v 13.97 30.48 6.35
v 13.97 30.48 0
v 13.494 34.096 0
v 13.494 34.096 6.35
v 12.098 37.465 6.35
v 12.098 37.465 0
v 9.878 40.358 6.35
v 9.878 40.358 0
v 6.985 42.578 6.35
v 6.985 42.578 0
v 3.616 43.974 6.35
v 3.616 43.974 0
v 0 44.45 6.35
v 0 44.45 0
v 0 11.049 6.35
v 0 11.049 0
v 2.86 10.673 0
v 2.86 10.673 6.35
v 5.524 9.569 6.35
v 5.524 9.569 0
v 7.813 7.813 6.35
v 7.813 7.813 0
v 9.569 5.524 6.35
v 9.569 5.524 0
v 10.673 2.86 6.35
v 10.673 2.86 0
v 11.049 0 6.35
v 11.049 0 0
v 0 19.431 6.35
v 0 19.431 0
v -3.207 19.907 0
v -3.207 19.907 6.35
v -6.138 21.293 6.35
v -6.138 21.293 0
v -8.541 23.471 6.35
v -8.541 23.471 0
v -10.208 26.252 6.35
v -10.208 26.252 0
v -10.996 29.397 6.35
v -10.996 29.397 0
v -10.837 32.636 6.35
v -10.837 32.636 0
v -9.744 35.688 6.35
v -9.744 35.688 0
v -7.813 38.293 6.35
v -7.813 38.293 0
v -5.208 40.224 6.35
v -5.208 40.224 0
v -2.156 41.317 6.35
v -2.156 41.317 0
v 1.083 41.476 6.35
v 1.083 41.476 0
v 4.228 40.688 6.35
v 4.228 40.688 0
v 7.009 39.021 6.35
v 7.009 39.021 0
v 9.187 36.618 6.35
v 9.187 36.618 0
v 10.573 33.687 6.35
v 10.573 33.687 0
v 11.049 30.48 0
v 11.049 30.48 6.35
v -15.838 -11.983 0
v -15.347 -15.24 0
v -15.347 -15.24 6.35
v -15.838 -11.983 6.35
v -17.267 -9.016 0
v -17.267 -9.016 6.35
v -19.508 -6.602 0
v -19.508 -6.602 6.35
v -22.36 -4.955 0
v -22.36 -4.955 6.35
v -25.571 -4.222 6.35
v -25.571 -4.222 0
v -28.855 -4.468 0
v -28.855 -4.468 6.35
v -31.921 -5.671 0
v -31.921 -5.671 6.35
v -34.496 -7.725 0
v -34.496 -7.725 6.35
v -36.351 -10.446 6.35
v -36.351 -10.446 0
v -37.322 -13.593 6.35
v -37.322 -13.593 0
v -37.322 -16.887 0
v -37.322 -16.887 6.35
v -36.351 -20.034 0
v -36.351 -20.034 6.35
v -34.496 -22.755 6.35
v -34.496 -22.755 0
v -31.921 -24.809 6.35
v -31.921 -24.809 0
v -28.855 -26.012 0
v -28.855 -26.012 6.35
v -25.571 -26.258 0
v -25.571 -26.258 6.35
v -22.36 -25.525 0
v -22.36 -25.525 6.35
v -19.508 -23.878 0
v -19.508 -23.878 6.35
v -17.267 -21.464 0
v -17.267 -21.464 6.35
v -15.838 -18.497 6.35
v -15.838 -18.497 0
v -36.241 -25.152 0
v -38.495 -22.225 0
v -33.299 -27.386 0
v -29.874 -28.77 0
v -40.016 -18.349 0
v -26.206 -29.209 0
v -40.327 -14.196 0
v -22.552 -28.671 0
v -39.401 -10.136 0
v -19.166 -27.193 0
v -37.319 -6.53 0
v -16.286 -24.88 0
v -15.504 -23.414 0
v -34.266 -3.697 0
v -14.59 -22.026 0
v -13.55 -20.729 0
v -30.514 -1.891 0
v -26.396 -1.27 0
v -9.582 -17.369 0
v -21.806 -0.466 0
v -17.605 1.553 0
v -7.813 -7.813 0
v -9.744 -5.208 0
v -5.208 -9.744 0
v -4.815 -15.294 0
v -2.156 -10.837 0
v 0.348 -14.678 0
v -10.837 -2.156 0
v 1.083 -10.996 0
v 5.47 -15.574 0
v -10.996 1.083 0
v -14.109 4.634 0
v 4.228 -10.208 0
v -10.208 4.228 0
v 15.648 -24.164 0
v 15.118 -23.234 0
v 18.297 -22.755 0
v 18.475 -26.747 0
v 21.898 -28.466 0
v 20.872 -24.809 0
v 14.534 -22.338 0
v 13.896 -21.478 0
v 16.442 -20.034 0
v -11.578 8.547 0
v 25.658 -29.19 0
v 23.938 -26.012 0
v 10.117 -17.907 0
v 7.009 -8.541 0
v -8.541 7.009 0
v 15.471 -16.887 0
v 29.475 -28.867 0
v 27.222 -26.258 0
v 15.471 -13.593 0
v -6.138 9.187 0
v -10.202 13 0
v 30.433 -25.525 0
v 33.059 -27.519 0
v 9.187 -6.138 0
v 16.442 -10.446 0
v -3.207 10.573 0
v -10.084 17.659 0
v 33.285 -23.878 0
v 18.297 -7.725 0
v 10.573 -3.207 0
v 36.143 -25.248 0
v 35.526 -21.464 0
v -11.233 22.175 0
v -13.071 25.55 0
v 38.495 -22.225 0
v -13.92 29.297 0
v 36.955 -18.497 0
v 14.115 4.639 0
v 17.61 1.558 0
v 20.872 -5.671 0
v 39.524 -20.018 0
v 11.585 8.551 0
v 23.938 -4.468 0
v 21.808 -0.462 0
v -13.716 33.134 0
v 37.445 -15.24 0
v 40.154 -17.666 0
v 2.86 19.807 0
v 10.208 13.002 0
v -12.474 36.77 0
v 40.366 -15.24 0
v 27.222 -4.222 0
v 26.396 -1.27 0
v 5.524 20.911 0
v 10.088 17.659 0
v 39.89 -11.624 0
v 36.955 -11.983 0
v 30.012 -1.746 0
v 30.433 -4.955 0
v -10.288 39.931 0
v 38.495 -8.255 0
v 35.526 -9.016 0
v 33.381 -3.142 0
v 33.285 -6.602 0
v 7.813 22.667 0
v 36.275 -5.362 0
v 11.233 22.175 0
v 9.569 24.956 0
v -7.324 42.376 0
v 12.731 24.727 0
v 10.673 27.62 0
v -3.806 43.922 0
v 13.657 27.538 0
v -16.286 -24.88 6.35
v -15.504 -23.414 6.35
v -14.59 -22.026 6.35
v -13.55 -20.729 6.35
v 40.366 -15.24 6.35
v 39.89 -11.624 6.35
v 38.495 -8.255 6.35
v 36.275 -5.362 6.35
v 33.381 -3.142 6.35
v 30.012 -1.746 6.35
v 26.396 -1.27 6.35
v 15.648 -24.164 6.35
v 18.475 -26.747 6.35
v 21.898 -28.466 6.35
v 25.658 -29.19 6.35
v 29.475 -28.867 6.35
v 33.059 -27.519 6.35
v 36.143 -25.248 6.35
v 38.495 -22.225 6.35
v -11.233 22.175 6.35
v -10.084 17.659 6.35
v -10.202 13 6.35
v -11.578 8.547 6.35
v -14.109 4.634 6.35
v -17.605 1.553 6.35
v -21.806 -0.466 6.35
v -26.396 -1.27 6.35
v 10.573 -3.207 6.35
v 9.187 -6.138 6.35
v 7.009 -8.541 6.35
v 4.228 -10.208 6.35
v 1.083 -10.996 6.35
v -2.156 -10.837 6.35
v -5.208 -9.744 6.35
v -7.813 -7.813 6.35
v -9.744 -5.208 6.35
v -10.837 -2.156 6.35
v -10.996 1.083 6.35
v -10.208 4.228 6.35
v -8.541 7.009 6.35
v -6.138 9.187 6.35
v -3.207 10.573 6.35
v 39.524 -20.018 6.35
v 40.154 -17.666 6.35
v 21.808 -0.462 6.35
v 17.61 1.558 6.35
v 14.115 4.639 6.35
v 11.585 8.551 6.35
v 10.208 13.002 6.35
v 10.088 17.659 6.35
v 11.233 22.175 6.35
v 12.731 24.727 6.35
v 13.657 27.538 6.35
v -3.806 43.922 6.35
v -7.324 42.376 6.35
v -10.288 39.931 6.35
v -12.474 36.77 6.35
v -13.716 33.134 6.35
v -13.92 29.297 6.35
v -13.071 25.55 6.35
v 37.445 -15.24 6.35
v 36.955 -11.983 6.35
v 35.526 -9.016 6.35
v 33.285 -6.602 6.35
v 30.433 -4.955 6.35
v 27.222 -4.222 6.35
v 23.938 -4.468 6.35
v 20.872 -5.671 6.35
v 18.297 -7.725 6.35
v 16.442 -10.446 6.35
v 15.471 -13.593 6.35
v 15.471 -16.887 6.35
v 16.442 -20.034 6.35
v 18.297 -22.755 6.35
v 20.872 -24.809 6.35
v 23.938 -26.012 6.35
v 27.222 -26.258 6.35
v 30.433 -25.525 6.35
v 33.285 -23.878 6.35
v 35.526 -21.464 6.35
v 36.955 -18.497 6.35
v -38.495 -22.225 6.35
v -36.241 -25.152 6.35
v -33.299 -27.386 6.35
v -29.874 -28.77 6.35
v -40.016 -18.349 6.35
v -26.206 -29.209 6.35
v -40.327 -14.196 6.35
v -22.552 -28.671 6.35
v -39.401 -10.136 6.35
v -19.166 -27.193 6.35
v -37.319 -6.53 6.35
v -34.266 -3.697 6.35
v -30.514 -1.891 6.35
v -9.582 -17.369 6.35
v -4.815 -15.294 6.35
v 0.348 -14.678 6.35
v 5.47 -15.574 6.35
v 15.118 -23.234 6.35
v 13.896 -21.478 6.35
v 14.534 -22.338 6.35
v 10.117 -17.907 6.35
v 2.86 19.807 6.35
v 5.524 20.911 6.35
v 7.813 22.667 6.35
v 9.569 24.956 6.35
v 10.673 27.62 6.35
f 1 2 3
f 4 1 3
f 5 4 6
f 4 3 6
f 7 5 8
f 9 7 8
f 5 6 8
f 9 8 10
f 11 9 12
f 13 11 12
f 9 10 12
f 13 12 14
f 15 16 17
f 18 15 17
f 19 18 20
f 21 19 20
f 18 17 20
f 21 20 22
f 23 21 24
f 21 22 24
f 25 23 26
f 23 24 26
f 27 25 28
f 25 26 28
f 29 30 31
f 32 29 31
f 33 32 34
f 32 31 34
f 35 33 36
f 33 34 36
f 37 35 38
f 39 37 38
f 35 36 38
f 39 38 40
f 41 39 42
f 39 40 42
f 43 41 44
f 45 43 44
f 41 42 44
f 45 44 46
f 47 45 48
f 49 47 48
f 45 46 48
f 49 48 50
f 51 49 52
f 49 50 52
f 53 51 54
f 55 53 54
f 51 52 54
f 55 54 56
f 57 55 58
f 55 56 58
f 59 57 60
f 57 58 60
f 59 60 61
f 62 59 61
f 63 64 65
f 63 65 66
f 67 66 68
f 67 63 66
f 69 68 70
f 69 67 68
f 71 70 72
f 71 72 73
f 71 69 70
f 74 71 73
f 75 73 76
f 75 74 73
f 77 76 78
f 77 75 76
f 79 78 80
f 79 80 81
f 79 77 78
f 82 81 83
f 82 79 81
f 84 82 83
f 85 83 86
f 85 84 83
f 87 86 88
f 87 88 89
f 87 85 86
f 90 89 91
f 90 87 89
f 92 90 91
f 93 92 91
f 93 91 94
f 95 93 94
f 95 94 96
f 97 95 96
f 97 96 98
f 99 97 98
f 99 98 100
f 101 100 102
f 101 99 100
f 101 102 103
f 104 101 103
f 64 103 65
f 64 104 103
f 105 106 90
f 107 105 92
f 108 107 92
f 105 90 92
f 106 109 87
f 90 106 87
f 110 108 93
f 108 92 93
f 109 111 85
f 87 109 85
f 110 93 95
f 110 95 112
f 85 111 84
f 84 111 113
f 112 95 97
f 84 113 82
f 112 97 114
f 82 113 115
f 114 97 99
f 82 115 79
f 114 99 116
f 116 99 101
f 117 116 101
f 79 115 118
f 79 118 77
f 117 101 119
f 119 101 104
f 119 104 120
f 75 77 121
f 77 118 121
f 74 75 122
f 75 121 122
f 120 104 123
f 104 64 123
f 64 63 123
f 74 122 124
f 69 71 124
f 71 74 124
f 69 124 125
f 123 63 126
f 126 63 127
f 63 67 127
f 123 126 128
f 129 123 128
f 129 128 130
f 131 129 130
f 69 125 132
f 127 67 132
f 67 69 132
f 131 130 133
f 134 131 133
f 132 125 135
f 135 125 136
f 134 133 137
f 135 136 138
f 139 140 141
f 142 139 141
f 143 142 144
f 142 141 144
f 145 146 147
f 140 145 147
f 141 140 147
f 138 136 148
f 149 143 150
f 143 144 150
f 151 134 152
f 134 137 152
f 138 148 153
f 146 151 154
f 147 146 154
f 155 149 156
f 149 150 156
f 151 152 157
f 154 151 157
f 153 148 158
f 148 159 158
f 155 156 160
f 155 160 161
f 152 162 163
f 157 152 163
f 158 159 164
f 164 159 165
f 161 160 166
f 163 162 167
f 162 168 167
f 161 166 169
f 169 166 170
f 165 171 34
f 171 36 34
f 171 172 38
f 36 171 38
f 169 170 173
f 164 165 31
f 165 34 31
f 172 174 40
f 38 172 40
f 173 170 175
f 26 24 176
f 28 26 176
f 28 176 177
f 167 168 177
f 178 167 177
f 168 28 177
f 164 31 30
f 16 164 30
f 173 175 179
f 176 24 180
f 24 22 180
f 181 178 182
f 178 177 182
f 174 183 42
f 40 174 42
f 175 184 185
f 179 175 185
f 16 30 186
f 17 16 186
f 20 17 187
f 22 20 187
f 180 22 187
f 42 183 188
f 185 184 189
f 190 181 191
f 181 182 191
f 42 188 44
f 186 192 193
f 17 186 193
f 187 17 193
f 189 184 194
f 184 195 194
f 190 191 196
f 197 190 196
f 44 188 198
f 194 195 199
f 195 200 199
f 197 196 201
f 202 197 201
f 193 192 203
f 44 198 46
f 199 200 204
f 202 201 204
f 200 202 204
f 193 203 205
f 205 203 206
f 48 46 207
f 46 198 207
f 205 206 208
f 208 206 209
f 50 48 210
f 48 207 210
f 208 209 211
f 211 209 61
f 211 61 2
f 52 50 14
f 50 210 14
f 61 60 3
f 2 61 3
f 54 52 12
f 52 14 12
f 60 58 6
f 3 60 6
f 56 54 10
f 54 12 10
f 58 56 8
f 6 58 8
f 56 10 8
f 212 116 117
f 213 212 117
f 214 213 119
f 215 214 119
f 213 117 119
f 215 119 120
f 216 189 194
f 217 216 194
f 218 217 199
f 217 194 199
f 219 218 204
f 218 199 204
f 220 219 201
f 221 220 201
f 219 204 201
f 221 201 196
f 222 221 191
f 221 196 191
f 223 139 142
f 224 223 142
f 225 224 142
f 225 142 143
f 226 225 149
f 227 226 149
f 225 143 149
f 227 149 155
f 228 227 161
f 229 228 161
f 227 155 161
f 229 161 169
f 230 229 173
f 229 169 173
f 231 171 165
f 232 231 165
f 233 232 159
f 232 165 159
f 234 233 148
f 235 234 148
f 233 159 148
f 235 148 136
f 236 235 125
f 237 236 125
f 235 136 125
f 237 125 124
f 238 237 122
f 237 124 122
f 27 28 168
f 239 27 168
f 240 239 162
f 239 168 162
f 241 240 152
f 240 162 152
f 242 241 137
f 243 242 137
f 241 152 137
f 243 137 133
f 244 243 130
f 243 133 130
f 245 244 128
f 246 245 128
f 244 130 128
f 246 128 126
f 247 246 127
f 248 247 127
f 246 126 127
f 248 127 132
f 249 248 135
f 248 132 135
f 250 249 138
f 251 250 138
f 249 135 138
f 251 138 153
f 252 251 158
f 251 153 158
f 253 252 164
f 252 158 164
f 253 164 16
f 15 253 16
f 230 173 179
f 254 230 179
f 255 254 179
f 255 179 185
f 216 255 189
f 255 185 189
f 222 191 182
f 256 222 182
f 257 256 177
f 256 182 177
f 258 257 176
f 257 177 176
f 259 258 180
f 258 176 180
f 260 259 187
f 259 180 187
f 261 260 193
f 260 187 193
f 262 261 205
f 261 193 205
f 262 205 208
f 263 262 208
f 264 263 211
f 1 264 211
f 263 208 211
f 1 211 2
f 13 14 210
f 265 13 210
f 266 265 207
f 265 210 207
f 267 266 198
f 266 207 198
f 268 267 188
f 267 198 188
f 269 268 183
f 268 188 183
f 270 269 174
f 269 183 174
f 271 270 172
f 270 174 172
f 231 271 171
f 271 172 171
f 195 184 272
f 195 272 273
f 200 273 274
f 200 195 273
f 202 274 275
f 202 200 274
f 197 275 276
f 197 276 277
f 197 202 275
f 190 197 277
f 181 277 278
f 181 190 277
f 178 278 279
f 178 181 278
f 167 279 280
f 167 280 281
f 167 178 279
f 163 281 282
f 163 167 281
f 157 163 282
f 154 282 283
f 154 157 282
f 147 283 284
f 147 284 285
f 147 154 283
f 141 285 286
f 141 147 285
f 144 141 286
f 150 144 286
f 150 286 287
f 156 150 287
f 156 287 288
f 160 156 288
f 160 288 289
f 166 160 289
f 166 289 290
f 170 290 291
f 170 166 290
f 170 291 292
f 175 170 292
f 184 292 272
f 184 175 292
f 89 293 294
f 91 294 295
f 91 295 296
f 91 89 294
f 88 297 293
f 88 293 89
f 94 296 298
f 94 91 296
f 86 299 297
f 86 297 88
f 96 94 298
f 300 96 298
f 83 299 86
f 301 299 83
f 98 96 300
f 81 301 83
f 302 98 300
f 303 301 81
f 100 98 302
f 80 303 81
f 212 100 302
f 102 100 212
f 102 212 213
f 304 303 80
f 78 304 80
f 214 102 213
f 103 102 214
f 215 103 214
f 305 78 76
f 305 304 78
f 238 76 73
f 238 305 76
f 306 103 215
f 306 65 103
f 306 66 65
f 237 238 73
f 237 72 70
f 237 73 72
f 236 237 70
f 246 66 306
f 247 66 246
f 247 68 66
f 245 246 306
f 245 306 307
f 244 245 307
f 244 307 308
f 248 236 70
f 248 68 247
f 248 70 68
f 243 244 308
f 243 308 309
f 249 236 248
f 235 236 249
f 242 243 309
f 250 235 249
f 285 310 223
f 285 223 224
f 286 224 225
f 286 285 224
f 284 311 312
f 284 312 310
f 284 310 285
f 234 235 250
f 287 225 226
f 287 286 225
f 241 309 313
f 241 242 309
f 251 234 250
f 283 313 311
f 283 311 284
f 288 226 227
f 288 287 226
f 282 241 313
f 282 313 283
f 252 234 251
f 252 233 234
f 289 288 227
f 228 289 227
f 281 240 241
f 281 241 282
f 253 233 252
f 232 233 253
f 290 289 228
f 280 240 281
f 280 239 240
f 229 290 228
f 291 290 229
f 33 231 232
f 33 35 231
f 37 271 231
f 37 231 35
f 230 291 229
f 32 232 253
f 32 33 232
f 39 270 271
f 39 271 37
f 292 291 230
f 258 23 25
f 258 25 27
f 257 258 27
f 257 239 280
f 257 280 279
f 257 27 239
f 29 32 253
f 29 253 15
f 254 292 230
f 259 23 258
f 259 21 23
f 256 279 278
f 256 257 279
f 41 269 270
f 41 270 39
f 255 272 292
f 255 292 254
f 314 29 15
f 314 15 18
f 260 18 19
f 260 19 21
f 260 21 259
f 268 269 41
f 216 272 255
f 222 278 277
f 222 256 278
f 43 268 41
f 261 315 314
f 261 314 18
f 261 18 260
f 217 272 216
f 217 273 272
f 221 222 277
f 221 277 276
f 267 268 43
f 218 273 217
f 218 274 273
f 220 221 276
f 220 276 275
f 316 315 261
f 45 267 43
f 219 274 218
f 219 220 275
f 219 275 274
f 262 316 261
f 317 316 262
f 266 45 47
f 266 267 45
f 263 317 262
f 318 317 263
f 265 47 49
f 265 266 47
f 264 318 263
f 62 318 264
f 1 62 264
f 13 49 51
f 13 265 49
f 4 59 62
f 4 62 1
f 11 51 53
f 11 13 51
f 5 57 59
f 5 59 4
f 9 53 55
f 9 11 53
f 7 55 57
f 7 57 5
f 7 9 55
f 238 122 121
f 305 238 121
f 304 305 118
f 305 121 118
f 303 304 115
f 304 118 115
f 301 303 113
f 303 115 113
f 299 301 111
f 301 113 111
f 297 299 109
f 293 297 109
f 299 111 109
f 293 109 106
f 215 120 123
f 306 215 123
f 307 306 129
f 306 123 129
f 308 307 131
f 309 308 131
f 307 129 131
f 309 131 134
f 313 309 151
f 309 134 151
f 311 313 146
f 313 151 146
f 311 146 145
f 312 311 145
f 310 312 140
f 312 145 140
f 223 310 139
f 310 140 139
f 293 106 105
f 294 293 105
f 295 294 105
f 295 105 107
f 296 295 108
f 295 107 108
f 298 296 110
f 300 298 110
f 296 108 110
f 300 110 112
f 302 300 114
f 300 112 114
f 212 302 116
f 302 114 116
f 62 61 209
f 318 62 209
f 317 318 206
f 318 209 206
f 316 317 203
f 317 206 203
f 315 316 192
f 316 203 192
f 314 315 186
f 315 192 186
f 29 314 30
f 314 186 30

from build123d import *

# Parameters (mm, degrees)
F1_R     = 11.049
F2_DEPTH = 6.35
F4_DEPTH = 6.35
F0_R     = 44.45
F0_R_2   = 11.049
F5_DEPTH = 113
F7_DEPTH = 6.351


# Not quite as in the source:
# - an extrude ends at something that could not be found from the text; its depth is read off the source's solid


with BuildPart() as f2:
    # F1 (on face) → F2 (new body)
    with BuildSketch(Plane.XY):
        with BuildLine():
            ThreePointArc((11.2333605356, 22.1750309406), (6.2904881464, 18.0064015264), (0, 16.51))
            ThreePointArc((0, 16.51), (-6.2904881464, 18.0064015264), (-11.2333605356, 22.1750309406))
            ThreePointArc((-11.2333605356, 22.1750309406), (-12.7087939307, 6.5033813584), (-26.3964543073, -1.27))
            ThreePointArc((-26.3964543073, -1.27), (-16.5181725742, -5.3617182668), (-12.4264543073, -15.24))
            ThreePointArc((-12.4264543073, -15.24), (-12.7102714474, -18.0416599946), (-13.5501907032, -20.7294818894))
            ThreePointArc((-13.5501907032, -20.7294818894), (0.3483634498, -14.677920264), (13.8964774264, -21.477906538))
            ThreePointArc((13.8964774264, -21.477906538), (14.5157040294, -7.8909406838), (26.3964543073, -1.27))
            ThreePointArc((26.3964543073, -1.27), (12.7154911257, 6.507712775), (11.2333605356, 22.1750309406))
        make_face()
        with BuildLine():
            ThreePointArc((0, 13.97), (9.8782817332, 9.8782817332), (13.97, 0))
            ThreePointArc((13.97, 0), (-9.8782817332, -9.8782817332), (0, 13.97))
        make_face(mode=Mode.SUBTRACT)
        with BuildLine():
            ThreePointArc((-11.2333605356, 22.1750309406), (-6.2904881464, 18.0064015264), (0, 16.51))
            ThreePointArc((0, 16.51), (6.2904881464, 18.0064015264), (11.2333605356, 22.1750309406))
            ThreePointArc((11.2333605356, 22.1750309406), (13.2682128918, 26.1078807588), (13.97, 30.48))
            ThreePointArc((13.97, 30.48), (9.8782817686, 40.3582816978), (1.001e-07, 44.45))
            ThreePointArc((1.001e-07, 44.45), (-12.473598451, 36.7704881911), (-11.2333605356, 22.1750309406))
        make_face()
        with BuildLine():
            ThreePointArc((11.049, 30.48), (7.8128228253, 22.6671771747), (0, 19.431))
            ThreePointArc((0, 19.431), (-7.8128228253, 38.2928228253), (11.049, 30.48))
        make_face(mode=Mode.SUBTRACT)
        with BuildLine():
            ThreePointArc((-12.4264543073, -15.24), (-16.5181725742, -5.3617182668), (-26.3964543073, -1.27))
            ThreePointArc((-26.3964543073, -1.27), (-38.4948290673, -8.2549997732), (-38.4948294602, -22.2249995463))
            ThreePointArc((-38.4948294602, -22.2249995463), (-28.0548757974, -29.11121257), (-16.2857729321, -24.8802812266))
            ThreePointArc((-16.2857729321, -24.8802812266), (-15.0629921605, -22.709312564), (-13.5501907032, -20.7294818894))
            ThreePointArc((-13.5501907032, -20.7294818894), (-12.7102714474, -18.0416599946), (-12.4264543073, -15.24))
        make_face()
        with Locations((-26.3964543073, -15.24)):
            Circle(F1_R, mode=Mode.SUBTRACT)
        with BuildLine():
            ThreePointArc((40.3664543073, -15.24), (36.2747360405, -5.3617182668), (26.3964543073, -1.27))
            ThreePointArc((26.3964543073, -1.27), (14.5157040294, -7.8909406838), (13.8964774264, -21.477906538))
            ThreePointArc((13.8964774264, -21.477906538), (14.8325747733, -22.7814148116), (15.6479806578, -24.1636323436))
            ThreePointArc((15.6479806578, -24.1636323436), (27.5776113359, -29.1599773015), (38.4948290898, -22.2250001877))
            ThreePointArc((38.4948290898, -22.2250001877), (39.8904380726, -18.8557021648), (40.3664543073, -15.24))
        make_face()
        with Locations((26.3964543073, -15.24)):
            Circle(F1_R, mode=Mode.SUBTRACT)
    extrude(amount=F2_DEPTH)

    # F3 (on face) → F4 (join)
    with BuildSketch(Plane.XY):
        with BuildLine():
            ThreePointArc((0, 13.97), (-9.8782817332, -9.8782817332), (13.97, 0))
            ThreePointArc((13.97, 0), (9.8782817332, 9.8782817332), (0, 13.97))
        make_face()
        with BuildLine():
            ThreePointArc((11.049, 0), (-7.8128228253, -7.8128228253), (0, 11.049))
            ThreePointArc((0, 11.049), (7.8128228253, 7.8128228253), (11.049, 0))
        make_face(mode=Mode.SUBTRACT)
    extrude(amount=F4_DEPTH)

    # F0 (on Top) → F5 (cut, through all)
    with BuildSketch(Plane.XY):
        Circle(F0_R)
        with Locations((-26.3964543073, -15.24)):
            Circle(F0_R_2, mode=Mode.SUBTRACT)
        with Locations((26.3964543073, -15.24)):
            Circle(F0_R_2, mode=Mode.SUBTRACT)
        with BuildLine():
            ThreePointArc((0, 11.049), (7.8128228253, 7.8128228253), (11.049, 0))
            ThreePointArc((11.049, 0), (-7.8128228253, -7.8128228253), (0, 11.049))
        make_face(mode=Mode.SUBTRACT)
        with BuildLine():
            ThreePointArc((11.049, 30.48), (7.8128228253, 22.6671771747), (0, 19.431))
            ThreePointArc((0, 19.431), (-7.8128228253, 38.2928228253), (11.049, 30.48))
        make_face(mode=Mode.SUBTRACT)
    extrude(amount=-F5_DEPTH, mode=Mode.SUBTRACT)

    # F6 (on face) → F7 (cut, through all)
    with BuildSketch(Plane.XY.offset(6.35)):
        with BuildLine():
            Line((-26.3964543073, 15.7554745193), (-26.3964543073, -1.27))
            ThreePointArc((-26.3964543073, -1.27), (-12.7087939307, 6.5033813584), (-11.2333605356, 22.1750309406))
            Line((-11.2333605356, 22.1750309406), (-26.3964543073, 15.7554745193))
        make_face()
    extrude(amount=-F7_DEPTH, mode=Mode.SUBTRACT)


solid = f2.part
